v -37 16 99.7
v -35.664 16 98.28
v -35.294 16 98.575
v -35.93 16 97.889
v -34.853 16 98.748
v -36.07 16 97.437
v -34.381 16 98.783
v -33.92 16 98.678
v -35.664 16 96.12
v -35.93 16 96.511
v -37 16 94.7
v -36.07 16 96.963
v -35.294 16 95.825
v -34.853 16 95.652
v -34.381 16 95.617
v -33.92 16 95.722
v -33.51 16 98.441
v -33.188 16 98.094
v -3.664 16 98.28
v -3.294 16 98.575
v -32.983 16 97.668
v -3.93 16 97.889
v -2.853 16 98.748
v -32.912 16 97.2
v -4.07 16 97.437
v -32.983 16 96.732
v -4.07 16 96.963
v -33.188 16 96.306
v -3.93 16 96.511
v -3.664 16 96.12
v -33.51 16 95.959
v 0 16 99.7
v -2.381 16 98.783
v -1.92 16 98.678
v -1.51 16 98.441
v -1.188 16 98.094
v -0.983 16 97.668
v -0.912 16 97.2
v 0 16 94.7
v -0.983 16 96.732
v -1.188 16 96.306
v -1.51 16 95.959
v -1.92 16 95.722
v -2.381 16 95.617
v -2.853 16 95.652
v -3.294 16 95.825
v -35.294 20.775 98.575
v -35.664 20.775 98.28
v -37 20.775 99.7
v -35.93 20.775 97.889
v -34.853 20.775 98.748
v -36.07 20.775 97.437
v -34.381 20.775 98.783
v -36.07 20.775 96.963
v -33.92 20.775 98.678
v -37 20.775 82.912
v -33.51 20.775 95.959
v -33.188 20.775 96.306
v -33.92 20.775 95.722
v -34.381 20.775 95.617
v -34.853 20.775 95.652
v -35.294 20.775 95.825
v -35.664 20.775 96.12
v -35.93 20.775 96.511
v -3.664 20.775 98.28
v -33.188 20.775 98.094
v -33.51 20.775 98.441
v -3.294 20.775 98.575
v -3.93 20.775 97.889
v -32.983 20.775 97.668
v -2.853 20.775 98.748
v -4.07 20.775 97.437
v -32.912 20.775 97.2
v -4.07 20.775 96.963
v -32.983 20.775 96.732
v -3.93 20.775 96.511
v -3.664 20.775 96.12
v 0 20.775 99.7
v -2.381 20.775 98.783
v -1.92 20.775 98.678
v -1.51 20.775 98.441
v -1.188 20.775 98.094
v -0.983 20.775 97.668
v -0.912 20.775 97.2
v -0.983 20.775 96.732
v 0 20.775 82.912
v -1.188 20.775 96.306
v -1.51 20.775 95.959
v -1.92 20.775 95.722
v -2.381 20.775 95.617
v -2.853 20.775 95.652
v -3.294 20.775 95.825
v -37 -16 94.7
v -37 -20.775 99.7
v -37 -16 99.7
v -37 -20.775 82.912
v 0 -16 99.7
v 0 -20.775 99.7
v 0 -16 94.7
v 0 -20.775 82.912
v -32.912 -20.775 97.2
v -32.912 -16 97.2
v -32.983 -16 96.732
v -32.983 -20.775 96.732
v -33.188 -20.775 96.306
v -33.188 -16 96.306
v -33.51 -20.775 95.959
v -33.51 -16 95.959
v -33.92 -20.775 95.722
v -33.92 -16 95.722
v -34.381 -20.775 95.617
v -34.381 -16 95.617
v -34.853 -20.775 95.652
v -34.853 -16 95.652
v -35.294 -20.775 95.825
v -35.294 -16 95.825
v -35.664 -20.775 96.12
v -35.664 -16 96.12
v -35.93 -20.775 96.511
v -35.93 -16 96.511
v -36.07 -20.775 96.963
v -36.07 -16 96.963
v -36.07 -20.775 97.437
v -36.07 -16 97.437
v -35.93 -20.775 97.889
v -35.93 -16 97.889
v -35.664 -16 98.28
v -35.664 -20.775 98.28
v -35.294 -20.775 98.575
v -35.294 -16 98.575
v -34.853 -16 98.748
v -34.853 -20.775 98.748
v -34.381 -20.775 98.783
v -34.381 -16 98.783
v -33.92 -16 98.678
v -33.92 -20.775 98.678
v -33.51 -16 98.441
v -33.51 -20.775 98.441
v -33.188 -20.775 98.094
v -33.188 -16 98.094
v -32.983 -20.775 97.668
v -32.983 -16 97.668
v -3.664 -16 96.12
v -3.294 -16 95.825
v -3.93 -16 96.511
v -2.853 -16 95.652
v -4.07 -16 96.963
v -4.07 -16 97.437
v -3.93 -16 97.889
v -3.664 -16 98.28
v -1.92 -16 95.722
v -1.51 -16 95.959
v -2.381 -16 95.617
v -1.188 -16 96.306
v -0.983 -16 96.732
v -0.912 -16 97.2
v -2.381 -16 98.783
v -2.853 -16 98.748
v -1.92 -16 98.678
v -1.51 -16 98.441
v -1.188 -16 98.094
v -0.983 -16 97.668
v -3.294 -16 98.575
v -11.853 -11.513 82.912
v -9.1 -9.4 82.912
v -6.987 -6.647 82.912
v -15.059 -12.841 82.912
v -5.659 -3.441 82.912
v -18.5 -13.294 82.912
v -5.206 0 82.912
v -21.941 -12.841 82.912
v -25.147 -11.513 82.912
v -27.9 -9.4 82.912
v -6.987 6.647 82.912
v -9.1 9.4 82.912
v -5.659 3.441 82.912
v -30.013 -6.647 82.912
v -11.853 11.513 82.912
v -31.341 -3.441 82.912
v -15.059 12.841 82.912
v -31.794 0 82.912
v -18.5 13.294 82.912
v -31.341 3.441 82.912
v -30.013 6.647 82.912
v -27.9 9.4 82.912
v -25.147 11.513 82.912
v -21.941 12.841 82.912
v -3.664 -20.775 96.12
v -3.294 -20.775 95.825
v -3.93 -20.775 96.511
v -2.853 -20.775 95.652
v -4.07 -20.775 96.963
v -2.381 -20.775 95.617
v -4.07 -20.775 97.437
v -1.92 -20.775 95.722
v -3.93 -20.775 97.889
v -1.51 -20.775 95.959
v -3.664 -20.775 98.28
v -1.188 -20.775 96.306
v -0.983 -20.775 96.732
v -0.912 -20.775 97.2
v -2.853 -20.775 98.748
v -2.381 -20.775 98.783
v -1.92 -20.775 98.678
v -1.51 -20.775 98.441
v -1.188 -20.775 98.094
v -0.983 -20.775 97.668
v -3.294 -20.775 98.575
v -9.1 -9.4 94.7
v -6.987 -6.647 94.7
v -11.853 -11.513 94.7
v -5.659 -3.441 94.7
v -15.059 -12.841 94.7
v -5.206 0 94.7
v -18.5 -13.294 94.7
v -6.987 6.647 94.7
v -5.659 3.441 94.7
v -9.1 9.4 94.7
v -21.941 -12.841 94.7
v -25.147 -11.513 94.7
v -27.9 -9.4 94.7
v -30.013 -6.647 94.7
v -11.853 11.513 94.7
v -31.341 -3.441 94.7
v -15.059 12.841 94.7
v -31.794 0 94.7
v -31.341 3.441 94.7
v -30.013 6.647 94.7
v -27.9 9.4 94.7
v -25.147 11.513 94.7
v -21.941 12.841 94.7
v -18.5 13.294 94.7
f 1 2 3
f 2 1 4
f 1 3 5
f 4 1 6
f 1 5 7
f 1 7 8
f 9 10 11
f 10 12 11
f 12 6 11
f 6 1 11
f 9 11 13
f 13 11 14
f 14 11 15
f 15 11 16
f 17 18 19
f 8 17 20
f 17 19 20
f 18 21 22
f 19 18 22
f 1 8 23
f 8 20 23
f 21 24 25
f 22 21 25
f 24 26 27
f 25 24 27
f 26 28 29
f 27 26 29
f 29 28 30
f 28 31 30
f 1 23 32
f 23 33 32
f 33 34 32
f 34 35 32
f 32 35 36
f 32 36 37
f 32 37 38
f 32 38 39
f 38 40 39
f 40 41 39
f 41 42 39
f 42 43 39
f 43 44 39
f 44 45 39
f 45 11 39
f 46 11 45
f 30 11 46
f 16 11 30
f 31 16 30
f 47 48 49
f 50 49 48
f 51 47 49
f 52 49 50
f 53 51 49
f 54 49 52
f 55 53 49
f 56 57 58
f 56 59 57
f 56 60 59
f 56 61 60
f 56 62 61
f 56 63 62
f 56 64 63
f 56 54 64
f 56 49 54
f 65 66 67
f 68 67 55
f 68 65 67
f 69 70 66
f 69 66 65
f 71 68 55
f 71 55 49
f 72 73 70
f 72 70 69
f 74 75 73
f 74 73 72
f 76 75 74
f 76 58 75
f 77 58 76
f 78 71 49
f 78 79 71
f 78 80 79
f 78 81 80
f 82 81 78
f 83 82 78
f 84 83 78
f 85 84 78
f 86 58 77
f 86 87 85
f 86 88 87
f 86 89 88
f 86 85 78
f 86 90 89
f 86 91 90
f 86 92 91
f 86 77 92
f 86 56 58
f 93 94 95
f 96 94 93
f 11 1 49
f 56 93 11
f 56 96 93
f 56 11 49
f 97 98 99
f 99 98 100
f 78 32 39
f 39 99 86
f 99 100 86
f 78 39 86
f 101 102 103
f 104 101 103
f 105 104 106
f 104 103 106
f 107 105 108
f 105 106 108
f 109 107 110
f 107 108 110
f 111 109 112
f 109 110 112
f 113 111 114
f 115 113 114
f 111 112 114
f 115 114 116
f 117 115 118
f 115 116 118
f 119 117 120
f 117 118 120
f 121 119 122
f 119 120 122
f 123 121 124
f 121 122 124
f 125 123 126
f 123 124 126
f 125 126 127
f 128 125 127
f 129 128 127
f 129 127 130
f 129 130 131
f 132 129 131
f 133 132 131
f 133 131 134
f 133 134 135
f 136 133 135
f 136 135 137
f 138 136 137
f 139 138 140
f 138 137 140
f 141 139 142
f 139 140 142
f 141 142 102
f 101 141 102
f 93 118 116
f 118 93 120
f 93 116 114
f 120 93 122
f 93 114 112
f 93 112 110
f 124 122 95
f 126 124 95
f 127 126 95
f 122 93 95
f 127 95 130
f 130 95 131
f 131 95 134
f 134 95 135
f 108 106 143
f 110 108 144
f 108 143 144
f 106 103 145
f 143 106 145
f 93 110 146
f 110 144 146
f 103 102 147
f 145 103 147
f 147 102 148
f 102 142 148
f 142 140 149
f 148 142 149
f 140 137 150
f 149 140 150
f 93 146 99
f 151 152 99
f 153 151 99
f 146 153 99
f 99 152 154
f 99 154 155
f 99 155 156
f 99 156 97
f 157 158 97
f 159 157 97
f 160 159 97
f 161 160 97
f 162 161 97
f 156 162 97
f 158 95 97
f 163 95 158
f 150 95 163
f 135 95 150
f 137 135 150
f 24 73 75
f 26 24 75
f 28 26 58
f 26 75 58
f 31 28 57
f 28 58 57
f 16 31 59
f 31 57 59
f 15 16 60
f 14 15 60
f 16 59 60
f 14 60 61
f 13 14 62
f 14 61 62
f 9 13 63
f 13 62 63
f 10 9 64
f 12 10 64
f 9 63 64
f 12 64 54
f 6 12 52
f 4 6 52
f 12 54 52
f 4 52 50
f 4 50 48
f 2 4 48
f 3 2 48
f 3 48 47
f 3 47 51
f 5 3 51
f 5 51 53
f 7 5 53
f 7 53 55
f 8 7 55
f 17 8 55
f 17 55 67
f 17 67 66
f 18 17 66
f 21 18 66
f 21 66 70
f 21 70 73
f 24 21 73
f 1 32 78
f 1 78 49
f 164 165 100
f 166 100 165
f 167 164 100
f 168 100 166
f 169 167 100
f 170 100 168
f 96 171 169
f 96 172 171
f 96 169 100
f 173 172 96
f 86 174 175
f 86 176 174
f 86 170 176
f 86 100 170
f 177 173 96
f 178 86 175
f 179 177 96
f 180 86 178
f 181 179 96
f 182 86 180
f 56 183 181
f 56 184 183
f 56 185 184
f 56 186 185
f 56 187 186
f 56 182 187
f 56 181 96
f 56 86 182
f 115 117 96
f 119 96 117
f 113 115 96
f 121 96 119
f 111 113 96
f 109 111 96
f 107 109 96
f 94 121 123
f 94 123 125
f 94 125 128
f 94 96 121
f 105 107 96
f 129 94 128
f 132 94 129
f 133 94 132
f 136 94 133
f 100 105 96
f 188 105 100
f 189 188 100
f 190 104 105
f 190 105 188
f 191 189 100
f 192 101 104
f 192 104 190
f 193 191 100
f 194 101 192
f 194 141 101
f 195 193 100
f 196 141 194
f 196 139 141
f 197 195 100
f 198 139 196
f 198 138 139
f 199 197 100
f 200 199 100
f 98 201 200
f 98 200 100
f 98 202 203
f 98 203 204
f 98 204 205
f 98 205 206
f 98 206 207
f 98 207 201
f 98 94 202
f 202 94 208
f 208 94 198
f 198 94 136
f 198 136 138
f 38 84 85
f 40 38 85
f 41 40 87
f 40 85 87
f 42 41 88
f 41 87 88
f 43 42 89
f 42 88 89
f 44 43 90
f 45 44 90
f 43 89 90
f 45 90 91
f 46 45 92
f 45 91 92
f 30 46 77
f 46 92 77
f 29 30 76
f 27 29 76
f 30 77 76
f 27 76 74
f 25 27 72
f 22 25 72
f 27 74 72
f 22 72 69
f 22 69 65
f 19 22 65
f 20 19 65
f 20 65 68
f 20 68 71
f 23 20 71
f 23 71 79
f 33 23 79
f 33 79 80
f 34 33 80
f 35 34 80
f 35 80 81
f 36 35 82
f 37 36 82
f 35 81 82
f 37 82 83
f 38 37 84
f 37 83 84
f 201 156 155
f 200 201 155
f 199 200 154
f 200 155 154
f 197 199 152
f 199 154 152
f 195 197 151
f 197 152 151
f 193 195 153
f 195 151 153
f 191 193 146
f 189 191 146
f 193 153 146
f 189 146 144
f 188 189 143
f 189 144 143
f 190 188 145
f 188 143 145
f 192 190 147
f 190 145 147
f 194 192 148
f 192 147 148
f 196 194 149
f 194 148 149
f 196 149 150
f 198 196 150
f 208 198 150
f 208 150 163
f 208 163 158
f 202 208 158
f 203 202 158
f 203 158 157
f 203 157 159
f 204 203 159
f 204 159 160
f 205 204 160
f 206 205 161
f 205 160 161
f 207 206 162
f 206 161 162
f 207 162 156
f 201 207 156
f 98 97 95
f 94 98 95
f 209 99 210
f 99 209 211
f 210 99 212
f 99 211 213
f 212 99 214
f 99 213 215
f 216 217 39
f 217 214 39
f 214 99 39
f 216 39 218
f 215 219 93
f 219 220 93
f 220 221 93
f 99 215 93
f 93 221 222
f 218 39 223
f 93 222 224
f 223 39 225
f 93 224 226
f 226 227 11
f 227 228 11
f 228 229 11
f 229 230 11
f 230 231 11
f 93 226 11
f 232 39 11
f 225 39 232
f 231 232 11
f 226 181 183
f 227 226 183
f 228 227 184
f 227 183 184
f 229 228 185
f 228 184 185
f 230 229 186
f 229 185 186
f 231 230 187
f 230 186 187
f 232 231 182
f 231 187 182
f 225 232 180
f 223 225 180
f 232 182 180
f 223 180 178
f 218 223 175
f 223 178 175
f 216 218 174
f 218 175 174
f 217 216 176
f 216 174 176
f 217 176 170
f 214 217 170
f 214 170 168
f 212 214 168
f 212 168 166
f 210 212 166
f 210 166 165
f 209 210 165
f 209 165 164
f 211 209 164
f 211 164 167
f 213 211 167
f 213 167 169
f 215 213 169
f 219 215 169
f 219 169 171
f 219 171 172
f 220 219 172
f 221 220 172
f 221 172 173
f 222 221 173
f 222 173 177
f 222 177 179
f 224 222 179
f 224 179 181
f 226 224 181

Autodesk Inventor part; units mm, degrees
ref_plane "YZ Plane" through (0, 0, 0) normal (1, 0, 0) x (0, 1, 0)
ref_plane "XZ Plane" through (0, 0, 0) normal (0, 1, 0) x (-1, 0, 0)
ref_plane "XY Plane" through (0, 0, 0) normal (0, 0, 1) x (1, 0, 0)
sketch "Sketch2" plane through (0, 0, 0) normal (1, 0, 0) x (0, 1, 0)
  circle A0 centre (0, 0) radius 13.2937
  line L0 (-16, -18.5) -> (16, -18.5)
  line L1 (16, -18.5) -> (16, 18.5)
  line L2 (16, 18.5) -> (-16, 18.5)
  line L3 (-16, 18.5) -> (-16, -18.5)
  line L4 (-16, -18.5) -> (16, 18.5) construction
  line L5 (16, -18.5) -> (-16, 18.5) construction
  dimension "d9" = 26.5875
  dimension "d10" = 32
  dimension "d11" = 37
extrude "Extrusion2" add sketch "Sketch2" along normal blind 76.2
sketch "Sketch3" plane through (0, -16, -18.5) normal (0, 0, -1) x (-1, 0, 0)
  line L0 (0, 0) -> (0, 32) projected
  circle A0 centre (18.5, 16) radius 13.2937
  line L1 (0, 32) -> (0, 0)
  line L2 (0, 0) -> (37, 0)
  line L3 (37, 0) -> (37, 32)
  line L4 (37, 32) -> (0, 32)
  line L5 (0, 32) -> (37, 0) construction
  line L6 (0, 0) -> (37, 32) construction
  point P0 (0, 16)
  dimension "d14" = 26.5875
  dimension "d15" = 32
  dimension "d16" = 37
extrude "Extrusion3" add sketch "Sketch3" against normal blind 113.2
sketch "Sketch4" plane through (76.2, -16, -18.5) normal (0, 0, -1) x (-1, 0, 0)
  circle A0 centre (94.7, 16) radius 13.2937 projected
  point P0 (76.2, 16)
extrude "Extrusion4" add sketch "Sketch4" against normal blind 37
sketch "Sketch5" plane through (76.2, 16, 18.5) normal (0, 1, 0) x (1, 0, 0)
  line L0 (-113.2, 37) -> (0, 37) projected
  line L1 (-113.2, 37) -> (-113.2, -76.2) projected
  line L2 (-113.2, 37) -> (-100.1185, 50.0815)
  line L3 (-113.2, 37) -> (-94.7, 37) construction
  line L4 (-113.2, 37) -> (-126.2815, 23.9185)
  line L5 (-113.2, 37) -> (-94.7, 37) construction
  line L6 (-100.1185, 50.0815) -> (-154.0001, 103.963)
  line L7 (-126.2815, 23.9185) -> (-180.163, 77.8001)
  line L8 (-126.2815, 23.9185) -> (-50.0815, 23.9185) construction
  line L9 (-154.0001, 103.963) -> (-180.163, 77.8001)
  line L10 (-100.1185, 50.0815) -> (-87.037, 37)
  line L11 (-126.2815, 23.9185) -> (-113.2, 10.837)
  point P0 (-76.2, 18.5)
  dimension "d21" = 18.5
  dimension "d22" = 45
  dimension "d23" = 18.5
  dimension "d24" = 135
  dimension "d25" = 76.2
  dimension "d26" = 76.2
  dimension "d27" = 135
extrude "Extrusion5" add sketch "Sketch5" against normal blind 32
sketch "Sketch7" plane through (-77.8001, -16, -85.463) normal (-0.7071, 0, -0.7071) x (-0.7071, 0, 0.7071)
  line L0 (37, 0) -> (37, 32)
  line L1 (37, 32) -> (0, 32)
  line L2 (0, 32) -> (0, 0)
  line L3 (0, 0) -> (37, 0)
  circle A0 centre (18.5, 16) radius 13.2937
  point P0 (5.4185, 16)
  point P1 (37, 16)
extrude "Extrusion6" cut sketch "Sketch7" against normal blind 101.6 contours A0
sketch "Sketch8" plane through (76.2, 16, 18.5) normal (0, 1, 0) x (1, 0, 0)
  line L0 (-76.2, 0) -> (0, 0) projected
  line L1 (-87.037, 37) -> (0, 37) projected
  line L2 (-87.037, 37) -> (-154.0001, 103.963) projected
  line L3 (-180.163, 77.8001) -> (-113.2, 10.837) projected
  line L4 (-113.2, 10.837) -> (-113.2, -76.2) projected
  line L5 (-76.2, 0) -> (-76.2, -76.2) projected
  line L6 (0, 37) -> (5, 37)
  line L7 (5, 37) -> (5, 0)
  line L8 (5, 0) -> (0, 0)
  line L9 (0, 0) -> (0, 37)
  line L10 (-113.2, -76.2) -> (-76.2, -76.2)
  line L11 (-76.2, -76.2) -> (-76.2, -81.2)
  line L12 (-76.2, -81.2) -> (-113.2, -81.2)
  line L13 (-113.2, -81.2) -> (-113.2, -76.2)
  line L14 (-180.163, 77.8001) -> (-183.6985, 81.3356)
  line L15 (-183.6985, 81.3356) -> (-157.5356, 107.4985)
  line L16 (-157.5356, 107.4985) -> (-154.0001, 103.963)
  point P0 (-76.2, 18.5)
  dimension "d32" = 5
  dimension "d33" = 5
  dimension "d34" = 5
  dimension "d35" = 90
extrude "Extrusion7" add sketch "Sketch8" along normal blind 4.7752
sketch "Sketch9" plane through (76.2, -16, -18.5) normal (0, -1, 0) x (1, 0, 0)
  line L0 (-87.037, 0) -> (0, 0) projected
  line L1 (-76.2, 37) -> (0, 37) projected
  line L2 (-76.2, 37) -> (-76.2, 113.2) projected
  line L3 (-113.2, 26.163) -> (-113.2, 113.2) projected
  line L4 (-113.2, 26.163) -> (-180.163, -40.8001) projected
  line L5 (-154.0001, -66.963) -> (-87.037, 0) projected
  line L6 (-76.2, 118.2) -> (-76.2, 37) projected
  line L7 (-113.2, 113.2) -> (-76.2, 113.2)
  line L8 (-76.2, 113.2) -> (-76.2, 118.2)
  line L9 (-76.2, 118.2) -> (-113.2, 118.2)
  line L10 (-113.2, 118.2) -> (-113.2, 113.2)
  line L11 (-76.2, 37) -> (5, 37) projected
  line L12 (0, 0) -> (5, 0)
  line L13 (5, 0) -> (5, 37)
  line L14 (5, 37) -> (0, 37)
  line L15 (0, 37) -> (0, 0)
  line L16 (-183.6985, -44.3356) -> (-113.2, 26.163) projected
  line L17 (-180.163, -40.8001) -> (-183.6985, -44.3356)
  line L18 (-183.6985, -44.3356) -> (-157.5356, -70.4985)
  line L19 (-157.5356, -70.4985) -> (-154.0001, -66.963)
  point P0 (-76.2, 18.5)
extrude "Extrusion8" add sketch "Sketch9" along normal blind 4.7752
sketch "Sketch10" plane through (76.2, 20.7752, 18.5) normal (0, 1, 0) x (1, 0, 0)
  circle A0 centre (2.5, 34.5) radius 1.5875
  circle A1 centre (2.5, 2.5) radius 1.5875
  line L0 (0, 37) -> (0, 0)
  line L1 (0, 0) -> (5, 0)
  line L2 (5, 37) -> (5, 0)
  line L3 (0, 37) -> (5, 37)
  point P0 (-76.2, 18.5)
  point P1 (0, 18.5)
extrude "Extrusion9" cut sketch "Sketch10" against normal blind 279.4 contours A0 | A1
sketch "Sketch11" plane through (76.2, 20.7752, 18.5) normal (0, 1, 0) x (1, 0, 0)
  circle A0 centre (-78.7, -78.7) radius 1.5875
  circle A1 centre (-110.7, -78.7) radius 1.5875
  line L0 (-76.2, -76.2) -> (-113.2, -76.2)
  line L1 (-113.2, -76.2) -> (-113.2, -81.2)
  line L2 (-76.2, -81.2) -> (-113.2, -81.2)
  line L3 (-76.2, -76.2) -> (-76.2, -81.2)
  circle A2 centre (-157.5356, 103.963) radius 1.5875
  circle A3 centre (-180.163, 81.3356) radius 1.5875
  line L4 (-157.5356, 107.4985) -> (-183.6985, 81.3356)
  line L5 (-183.6985, 81.3356) -> (-180.163, 77.8001)
  line L6 (-154.0001, 103.963) -> (-180.163, 77.8001)
  line L7 (-157.5356, 107.4985) -> (-154.0001, 103.963)
  point P0 (-76.2, 18.5)
  point P1 (-94.7, -76.2)
  point P2 (-170.6171, 94.4171)
extrude "Extrusion10" cut sketch "Sketch11" against normal blind 279.4 contours A0 | A1 | A2 | A3
sketch "Sketch12" plane through (76.2, 20.7752, 18.5) normal (0, 1, 0) x (1, 0, 0)
  circle A0 centre (-157.5356, 103.963) radius 1.5875 projected
  circle A1 centre (-180.163, 81.3356) radius 1.5875 projected
  circle A2 centre (2.5, 2.5) radius 1.5875 projected
  circle A3 centre (2.5, 34.5) radius 1.5875 projected
  line L0 (-204.7971, 116.7224) -> (14.3752, 116.7224)
  line L1 (14.3752, 116.7224) -> (14.3752, -64.4123)
  line L2 (14.3752, -64.4123) -> (-204.7971, -64.4123)
  line L3 (-204.7971, -64.4123) -> (-204.7971, 116.7224)
  point P0 (-76.2, 18.5)
extrude "Extrusion11" cut sketch "Sketch12" against normal blind 76.2
properties part number "testPrintBracket"
